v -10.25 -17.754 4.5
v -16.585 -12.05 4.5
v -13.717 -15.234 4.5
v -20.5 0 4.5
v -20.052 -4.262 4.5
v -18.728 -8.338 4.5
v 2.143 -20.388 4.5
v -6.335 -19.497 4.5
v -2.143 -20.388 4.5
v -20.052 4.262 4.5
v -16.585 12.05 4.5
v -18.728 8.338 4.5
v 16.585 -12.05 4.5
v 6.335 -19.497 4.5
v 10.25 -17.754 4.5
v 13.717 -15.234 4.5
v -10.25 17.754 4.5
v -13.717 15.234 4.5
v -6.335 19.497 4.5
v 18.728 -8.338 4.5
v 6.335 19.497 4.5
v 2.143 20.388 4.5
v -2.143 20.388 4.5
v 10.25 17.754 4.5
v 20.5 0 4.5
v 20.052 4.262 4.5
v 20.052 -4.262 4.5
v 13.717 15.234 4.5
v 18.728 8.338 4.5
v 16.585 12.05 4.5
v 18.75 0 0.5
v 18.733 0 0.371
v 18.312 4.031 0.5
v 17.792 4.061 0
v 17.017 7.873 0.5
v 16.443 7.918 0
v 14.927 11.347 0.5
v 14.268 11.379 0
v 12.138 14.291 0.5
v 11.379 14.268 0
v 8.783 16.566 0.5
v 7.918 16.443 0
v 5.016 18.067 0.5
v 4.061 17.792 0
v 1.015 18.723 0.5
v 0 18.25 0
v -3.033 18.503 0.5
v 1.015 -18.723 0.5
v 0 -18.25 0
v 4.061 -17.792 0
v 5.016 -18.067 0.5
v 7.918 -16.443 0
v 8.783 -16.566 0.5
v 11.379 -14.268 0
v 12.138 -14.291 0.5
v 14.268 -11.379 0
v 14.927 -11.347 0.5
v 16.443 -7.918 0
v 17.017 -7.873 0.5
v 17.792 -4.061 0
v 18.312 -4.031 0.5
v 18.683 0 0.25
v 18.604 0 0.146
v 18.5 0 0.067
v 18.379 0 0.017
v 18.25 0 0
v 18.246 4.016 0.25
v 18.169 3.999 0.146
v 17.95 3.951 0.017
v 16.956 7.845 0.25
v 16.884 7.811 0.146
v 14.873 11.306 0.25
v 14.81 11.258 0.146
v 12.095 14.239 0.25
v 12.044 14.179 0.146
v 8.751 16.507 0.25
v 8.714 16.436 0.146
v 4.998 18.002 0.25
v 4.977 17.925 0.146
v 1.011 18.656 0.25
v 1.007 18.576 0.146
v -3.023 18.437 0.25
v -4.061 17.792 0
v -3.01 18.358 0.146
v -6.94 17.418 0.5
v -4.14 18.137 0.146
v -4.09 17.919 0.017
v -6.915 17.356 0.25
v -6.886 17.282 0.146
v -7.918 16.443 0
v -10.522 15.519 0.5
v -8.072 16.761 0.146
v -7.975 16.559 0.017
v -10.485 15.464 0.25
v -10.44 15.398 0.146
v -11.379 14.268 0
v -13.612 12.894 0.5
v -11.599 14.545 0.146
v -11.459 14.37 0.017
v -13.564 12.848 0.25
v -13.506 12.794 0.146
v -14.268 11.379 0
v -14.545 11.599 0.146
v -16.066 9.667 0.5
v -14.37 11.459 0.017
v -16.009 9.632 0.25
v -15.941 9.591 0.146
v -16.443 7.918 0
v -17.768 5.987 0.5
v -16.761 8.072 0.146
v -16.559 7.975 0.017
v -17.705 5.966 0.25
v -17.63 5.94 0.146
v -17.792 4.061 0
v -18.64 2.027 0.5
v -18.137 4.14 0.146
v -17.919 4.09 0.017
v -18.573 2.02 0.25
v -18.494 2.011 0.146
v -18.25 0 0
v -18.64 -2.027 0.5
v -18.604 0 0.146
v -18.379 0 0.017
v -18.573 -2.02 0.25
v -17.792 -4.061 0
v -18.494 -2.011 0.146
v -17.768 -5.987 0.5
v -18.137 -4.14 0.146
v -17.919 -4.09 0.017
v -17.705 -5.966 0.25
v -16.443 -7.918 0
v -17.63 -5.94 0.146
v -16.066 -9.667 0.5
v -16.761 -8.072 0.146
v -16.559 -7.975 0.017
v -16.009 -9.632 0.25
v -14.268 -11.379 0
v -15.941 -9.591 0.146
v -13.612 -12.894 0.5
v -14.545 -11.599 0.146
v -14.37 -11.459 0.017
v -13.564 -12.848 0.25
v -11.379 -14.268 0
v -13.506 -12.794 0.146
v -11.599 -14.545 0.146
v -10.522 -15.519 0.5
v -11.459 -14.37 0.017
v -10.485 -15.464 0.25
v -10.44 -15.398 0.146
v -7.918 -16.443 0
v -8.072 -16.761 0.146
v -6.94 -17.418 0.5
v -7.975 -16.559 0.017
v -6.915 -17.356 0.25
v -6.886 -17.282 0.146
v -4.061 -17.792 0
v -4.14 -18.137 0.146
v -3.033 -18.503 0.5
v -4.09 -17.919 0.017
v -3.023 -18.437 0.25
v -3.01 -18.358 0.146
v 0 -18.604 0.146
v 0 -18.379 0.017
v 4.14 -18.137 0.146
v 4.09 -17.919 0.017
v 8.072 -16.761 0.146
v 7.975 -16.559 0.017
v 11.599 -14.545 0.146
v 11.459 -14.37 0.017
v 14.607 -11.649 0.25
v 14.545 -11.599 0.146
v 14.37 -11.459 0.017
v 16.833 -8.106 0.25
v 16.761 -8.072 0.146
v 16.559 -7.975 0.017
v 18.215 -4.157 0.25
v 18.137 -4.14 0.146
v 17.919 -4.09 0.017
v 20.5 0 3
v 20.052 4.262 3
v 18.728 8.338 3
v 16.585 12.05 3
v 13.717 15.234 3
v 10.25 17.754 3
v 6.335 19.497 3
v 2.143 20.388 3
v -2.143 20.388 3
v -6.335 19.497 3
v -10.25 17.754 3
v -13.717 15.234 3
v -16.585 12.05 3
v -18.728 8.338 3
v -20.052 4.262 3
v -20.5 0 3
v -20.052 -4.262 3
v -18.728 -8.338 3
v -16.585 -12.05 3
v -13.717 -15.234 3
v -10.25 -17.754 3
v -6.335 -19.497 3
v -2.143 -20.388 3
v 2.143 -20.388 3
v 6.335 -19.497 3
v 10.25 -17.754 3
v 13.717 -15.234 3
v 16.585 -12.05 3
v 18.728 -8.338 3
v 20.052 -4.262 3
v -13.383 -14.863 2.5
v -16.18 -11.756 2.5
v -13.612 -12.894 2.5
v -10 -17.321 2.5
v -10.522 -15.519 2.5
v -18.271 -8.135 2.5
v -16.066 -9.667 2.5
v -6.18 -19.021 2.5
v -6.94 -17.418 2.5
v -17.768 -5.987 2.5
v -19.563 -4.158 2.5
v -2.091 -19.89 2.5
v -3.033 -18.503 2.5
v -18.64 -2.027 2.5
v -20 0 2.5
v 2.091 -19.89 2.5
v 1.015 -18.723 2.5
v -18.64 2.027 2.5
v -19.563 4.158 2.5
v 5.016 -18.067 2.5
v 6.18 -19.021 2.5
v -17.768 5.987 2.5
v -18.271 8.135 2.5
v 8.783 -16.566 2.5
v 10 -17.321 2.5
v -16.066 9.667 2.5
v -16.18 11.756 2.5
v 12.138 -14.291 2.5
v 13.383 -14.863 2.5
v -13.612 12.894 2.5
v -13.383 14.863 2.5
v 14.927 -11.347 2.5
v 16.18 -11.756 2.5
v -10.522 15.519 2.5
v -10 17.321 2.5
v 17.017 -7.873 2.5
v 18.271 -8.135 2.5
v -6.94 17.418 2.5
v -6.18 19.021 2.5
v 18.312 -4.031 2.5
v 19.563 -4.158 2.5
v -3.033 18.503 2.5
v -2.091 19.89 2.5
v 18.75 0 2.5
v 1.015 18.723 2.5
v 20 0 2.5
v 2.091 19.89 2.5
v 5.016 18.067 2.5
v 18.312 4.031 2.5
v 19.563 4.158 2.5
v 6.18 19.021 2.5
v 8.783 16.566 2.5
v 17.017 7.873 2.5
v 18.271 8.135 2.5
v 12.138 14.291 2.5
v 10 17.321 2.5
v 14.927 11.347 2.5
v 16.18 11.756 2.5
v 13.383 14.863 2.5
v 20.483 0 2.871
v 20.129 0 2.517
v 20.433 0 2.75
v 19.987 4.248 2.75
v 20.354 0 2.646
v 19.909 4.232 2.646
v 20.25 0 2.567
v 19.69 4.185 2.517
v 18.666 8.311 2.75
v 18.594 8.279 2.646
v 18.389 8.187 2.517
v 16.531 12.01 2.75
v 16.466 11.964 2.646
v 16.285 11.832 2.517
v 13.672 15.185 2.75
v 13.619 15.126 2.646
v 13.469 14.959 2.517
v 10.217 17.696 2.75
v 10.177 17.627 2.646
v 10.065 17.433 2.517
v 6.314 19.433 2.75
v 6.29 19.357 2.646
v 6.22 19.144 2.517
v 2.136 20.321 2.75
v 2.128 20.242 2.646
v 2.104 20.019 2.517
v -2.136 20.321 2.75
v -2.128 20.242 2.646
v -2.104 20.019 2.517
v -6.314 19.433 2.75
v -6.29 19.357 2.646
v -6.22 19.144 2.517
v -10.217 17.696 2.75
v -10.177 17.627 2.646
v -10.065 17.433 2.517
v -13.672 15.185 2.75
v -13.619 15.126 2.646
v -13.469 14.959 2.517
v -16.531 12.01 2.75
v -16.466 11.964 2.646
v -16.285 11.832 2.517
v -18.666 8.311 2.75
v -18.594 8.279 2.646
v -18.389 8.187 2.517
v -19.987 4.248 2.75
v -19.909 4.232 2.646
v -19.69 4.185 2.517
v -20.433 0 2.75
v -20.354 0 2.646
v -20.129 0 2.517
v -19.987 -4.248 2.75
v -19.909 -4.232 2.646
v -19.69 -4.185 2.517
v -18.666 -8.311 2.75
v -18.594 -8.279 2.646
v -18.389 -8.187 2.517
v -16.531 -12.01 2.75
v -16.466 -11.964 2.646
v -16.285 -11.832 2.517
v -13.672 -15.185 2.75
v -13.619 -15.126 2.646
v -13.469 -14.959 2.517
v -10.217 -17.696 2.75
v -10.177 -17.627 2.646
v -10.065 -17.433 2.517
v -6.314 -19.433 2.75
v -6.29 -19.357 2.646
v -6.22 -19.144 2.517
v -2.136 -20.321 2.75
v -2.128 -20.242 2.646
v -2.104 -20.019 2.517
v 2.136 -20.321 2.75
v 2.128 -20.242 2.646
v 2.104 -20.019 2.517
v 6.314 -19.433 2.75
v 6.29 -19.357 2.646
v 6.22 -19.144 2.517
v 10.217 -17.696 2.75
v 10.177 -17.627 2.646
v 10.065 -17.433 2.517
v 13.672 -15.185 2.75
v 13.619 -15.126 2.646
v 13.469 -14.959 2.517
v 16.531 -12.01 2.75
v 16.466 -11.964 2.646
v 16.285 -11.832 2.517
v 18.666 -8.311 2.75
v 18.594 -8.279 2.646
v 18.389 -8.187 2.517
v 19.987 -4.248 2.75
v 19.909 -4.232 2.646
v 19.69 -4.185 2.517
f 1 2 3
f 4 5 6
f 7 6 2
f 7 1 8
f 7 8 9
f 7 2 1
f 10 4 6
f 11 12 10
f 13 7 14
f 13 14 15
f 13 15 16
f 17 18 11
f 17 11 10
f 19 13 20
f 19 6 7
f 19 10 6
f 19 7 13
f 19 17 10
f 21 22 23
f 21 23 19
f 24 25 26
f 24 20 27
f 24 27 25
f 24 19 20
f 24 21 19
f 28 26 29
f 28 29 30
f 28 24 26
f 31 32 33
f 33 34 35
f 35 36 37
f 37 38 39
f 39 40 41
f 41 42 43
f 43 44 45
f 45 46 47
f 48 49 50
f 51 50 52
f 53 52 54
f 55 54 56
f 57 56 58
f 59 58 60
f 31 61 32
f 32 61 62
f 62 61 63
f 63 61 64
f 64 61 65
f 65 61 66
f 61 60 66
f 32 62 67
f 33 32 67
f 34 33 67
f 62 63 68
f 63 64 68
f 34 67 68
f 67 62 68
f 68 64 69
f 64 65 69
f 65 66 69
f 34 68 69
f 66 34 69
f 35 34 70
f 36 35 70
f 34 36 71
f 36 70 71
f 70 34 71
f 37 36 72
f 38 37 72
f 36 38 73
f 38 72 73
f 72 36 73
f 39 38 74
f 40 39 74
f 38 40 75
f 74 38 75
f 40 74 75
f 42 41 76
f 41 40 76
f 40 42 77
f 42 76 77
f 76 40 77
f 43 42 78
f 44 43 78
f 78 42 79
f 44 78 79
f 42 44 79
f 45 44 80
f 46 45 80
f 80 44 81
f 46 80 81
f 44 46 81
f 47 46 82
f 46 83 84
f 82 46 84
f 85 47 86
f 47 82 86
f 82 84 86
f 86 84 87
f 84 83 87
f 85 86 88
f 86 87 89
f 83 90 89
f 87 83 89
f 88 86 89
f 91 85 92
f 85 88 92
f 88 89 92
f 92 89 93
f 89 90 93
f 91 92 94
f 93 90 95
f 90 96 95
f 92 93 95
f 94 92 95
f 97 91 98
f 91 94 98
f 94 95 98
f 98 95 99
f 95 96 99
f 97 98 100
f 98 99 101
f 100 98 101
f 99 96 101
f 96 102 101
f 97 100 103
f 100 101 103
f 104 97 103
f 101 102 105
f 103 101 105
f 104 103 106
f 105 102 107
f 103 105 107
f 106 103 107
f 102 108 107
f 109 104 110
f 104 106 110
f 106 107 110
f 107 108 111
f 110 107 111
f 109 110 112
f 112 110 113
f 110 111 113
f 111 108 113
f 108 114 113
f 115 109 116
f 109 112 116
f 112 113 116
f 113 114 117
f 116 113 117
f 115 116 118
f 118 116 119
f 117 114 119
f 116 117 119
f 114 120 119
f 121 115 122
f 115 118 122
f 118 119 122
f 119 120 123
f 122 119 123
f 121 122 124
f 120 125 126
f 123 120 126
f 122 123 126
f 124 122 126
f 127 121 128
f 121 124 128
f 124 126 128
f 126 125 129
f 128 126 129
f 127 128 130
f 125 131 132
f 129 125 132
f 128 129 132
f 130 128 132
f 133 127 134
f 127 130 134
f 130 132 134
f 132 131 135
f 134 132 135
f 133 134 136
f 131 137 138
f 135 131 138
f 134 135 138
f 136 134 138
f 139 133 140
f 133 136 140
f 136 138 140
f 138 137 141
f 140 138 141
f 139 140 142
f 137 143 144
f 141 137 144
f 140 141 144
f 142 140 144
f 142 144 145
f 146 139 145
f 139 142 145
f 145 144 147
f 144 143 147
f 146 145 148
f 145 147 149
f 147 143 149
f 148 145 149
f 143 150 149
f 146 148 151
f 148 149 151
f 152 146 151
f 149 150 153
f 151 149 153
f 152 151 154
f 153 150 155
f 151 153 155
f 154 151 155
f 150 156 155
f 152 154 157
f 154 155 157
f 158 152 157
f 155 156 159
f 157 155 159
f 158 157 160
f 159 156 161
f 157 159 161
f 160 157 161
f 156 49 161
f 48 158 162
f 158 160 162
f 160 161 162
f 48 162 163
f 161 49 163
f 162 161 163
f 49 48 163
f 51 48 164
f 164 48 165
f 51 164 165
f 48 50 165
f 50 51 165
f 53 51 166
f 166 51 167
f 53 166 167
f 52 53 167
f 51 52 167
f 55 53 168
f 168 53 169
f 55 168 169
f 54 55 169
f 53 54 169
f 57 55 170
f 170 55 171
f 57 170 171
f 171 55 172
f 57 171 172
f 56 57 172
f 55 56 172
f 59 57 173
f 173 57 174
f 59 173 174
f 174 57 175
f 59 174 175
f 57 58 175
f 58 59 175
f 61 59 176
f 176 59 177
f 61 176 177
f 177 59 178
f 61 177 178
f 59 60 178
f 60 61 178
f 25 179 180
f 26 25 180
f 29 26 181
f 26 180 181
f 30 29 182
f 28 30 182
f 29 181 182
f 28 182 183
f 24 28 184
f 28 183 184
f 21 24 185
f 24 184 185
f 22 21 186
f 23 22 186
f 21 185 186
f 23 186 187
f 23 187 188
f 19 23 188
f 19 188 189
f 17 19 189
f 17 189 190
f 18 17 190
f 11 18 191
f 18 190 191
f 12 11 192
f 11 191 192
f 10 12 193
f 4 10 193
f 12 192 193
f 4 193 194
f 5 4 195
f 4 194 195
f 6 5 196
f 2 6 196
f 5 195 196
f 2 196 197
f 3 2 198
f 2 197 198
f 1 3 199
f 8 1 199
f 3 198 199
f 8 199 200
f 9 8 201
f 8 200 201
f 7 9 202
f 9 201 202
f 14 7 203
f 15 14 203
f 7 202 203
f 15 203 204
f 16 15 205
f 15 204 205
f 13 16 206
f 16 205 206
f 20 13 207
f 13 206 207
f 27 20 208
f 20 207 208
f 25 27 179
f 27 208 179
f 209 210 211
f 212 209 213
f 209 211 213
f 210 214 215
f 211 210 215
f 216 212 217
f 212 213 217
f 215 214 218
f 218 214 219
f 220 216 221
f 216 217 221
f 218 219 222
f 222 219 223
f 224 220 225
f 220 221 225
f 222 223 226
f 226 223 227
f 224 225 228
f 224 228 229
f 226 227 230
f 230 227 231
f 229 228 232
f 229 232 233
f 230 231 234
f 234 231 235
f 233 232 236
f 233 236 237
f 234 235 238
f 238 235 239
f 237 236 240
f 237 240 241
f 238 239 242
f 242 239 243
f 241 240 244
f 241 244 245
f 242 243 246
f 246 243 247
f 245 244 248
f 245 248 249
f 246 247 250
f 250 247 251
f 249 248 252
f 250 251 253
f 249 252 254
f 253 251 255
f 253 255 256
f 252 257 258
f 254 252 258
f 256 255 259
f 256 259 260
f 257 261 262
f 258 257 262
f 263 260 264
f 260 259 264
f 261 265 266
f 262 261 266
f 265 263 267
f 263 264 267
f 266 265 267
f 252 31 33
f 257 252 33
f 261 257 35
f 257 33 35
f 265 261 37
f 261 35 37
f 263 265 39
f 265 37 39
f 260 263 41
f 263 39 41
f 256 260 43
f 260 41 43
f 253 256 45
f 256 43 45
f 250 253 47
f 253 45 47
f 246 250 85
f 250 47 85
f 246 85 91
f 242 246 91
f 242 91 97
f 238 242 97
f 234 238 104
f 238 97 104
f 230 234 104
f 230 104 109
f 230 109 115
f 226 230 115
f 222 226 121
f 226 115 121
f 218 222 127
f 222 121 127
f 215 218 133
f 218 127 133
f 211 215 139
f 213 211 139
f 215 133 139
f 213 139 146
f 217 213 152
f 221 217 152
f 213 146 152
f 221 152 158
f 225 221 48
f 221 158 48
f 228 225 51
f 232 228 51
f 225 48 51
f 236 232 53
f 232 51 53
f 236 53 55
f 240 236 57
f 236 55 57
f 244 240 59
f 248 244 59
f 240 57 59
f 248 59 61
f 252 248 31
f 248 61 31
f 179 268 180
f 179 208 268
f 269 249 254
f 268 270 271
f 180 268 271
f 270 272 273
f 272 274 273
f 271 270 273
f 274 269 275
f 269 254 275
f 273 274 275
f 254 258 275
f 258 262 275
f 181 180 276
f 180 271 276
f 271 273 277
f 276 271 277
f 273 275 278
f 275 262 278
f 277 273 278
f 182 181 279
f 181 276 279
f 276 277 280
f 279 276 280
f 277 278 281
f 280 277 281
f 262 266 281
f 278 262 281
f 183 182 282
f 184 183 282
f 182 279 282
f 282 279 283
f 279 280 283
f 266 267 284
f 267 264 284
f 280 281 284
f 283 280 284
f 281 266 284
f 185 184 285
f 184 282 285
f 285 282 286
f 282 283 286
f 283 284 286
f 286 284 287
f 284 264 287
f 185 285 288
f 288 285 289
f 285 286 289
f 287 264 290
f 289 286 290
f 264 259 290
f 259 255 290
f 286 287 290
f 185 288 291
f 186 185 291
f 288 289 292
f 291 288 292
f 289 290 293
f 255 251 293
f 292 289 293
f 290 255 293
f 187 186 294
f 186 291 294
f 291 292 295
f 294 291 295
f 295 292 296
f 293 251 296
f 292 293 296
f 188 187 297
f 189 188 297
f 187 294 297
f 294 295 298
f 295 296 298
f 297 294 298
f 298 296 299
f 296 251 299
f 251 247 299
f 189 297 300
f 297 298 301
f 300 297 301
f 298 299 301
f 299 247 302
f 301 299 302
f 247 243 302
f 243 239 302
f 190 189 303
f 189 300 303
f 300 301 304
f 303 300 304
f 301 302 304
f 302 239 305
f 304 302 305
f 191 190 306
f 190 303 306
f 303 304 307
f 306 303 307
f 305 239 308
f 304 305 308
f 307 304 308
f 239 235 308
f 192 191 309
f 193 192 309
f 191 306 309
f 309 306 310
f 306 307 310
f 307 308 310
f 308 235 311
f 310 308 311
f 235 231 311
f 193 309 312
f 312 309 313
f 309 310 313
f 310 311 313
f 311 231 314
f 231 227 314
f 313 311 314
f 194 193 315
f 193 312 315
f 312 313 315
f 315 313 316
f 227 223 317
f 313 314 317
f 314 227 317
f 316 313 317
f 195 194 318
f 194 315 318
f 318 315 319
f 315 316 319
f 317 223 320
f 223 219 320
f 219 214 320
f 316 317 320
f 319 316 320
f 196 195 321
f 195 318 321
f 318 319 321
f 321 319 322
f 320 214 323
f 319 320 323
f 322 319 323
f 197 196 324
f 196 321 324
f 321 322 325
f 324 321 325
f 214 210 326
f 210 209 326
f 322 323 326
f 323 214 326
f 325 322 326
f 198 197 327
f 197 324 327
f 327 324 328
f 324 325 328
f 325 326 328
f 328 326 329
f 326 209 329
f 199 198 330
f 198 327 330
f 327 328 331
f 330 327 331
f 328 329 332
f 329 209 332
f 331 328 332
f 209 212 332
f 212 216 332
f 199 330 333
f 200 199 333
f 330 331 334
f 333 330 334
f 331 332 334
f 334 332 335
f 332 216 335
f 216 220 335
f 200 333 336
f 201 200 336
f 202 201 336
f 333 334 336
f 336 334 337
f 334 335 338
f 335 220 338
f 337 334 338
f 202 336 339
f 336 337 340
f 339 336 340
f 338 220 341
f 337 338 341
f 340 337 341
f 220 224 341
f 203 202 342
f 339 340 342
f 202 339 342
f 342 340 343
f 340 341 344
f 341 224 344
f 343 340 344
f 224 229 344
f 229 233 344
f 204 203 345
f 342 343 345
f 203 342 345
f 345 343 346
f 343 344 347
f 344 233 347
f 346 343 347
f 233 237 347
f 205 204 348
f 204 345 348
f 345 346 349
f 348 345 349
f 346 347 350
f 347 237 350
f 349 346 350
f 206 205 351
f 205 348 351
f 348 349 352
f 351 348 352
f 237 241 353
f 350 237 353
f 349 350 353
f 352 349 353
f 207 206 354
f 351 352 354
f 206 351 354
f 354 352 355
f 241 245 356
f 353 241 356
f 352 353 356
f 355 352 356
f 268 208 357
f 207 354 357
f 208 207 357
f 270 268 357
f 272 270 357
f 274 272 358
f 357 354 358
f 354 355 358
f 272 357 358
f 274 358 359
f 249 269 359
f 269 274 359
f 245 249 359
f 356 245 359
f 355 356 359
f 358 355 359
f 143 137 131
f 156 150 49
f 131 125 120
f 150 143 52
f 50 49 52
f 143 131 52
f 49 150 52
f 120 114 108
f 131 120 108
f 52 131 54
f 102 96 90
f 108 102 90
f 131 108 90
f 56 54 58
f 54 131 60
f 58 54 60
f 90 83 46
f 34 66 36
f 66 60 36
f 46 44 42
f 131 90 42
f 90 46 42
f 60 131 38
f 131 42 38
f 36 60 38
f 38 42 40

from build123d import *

# Parameters (mm, degrees)
F0_R     = 18.75
F1_DEPTH = 2.5
F2_R     = 0.5
F3_R     = 20.5
F4_DEPTH = 2
F5_R     = 0.5


with BuildPart() as f1:
    # F0 (on Top) → F1 (new body)
    with BuildSketch(Plane.XY):
        Circle(F0_R)
    extrude(amount=F1_DEPTH)

    # F2
    f2_edges = [f1.edges().sort_by_distance(p)[0] for p in [
        (-18.75, 0, 0),
    ]]
    fillet(f2_edges, radius=F2_R)

    # F3 (on face) → F4 (join)
    with BuildSketch(Plane.XY.offset(2.5)):
        Circle(F3_R)
    extrude(amount=F4_DEPTH)

    # F5
    f5_edges = [f1.edges().sort_by_distance(p)[0] for p in [
        (-20.5, 0, 2.5),
    ]]
    fillet(f5_edges, radius=F5_R)


solid = f1.part
